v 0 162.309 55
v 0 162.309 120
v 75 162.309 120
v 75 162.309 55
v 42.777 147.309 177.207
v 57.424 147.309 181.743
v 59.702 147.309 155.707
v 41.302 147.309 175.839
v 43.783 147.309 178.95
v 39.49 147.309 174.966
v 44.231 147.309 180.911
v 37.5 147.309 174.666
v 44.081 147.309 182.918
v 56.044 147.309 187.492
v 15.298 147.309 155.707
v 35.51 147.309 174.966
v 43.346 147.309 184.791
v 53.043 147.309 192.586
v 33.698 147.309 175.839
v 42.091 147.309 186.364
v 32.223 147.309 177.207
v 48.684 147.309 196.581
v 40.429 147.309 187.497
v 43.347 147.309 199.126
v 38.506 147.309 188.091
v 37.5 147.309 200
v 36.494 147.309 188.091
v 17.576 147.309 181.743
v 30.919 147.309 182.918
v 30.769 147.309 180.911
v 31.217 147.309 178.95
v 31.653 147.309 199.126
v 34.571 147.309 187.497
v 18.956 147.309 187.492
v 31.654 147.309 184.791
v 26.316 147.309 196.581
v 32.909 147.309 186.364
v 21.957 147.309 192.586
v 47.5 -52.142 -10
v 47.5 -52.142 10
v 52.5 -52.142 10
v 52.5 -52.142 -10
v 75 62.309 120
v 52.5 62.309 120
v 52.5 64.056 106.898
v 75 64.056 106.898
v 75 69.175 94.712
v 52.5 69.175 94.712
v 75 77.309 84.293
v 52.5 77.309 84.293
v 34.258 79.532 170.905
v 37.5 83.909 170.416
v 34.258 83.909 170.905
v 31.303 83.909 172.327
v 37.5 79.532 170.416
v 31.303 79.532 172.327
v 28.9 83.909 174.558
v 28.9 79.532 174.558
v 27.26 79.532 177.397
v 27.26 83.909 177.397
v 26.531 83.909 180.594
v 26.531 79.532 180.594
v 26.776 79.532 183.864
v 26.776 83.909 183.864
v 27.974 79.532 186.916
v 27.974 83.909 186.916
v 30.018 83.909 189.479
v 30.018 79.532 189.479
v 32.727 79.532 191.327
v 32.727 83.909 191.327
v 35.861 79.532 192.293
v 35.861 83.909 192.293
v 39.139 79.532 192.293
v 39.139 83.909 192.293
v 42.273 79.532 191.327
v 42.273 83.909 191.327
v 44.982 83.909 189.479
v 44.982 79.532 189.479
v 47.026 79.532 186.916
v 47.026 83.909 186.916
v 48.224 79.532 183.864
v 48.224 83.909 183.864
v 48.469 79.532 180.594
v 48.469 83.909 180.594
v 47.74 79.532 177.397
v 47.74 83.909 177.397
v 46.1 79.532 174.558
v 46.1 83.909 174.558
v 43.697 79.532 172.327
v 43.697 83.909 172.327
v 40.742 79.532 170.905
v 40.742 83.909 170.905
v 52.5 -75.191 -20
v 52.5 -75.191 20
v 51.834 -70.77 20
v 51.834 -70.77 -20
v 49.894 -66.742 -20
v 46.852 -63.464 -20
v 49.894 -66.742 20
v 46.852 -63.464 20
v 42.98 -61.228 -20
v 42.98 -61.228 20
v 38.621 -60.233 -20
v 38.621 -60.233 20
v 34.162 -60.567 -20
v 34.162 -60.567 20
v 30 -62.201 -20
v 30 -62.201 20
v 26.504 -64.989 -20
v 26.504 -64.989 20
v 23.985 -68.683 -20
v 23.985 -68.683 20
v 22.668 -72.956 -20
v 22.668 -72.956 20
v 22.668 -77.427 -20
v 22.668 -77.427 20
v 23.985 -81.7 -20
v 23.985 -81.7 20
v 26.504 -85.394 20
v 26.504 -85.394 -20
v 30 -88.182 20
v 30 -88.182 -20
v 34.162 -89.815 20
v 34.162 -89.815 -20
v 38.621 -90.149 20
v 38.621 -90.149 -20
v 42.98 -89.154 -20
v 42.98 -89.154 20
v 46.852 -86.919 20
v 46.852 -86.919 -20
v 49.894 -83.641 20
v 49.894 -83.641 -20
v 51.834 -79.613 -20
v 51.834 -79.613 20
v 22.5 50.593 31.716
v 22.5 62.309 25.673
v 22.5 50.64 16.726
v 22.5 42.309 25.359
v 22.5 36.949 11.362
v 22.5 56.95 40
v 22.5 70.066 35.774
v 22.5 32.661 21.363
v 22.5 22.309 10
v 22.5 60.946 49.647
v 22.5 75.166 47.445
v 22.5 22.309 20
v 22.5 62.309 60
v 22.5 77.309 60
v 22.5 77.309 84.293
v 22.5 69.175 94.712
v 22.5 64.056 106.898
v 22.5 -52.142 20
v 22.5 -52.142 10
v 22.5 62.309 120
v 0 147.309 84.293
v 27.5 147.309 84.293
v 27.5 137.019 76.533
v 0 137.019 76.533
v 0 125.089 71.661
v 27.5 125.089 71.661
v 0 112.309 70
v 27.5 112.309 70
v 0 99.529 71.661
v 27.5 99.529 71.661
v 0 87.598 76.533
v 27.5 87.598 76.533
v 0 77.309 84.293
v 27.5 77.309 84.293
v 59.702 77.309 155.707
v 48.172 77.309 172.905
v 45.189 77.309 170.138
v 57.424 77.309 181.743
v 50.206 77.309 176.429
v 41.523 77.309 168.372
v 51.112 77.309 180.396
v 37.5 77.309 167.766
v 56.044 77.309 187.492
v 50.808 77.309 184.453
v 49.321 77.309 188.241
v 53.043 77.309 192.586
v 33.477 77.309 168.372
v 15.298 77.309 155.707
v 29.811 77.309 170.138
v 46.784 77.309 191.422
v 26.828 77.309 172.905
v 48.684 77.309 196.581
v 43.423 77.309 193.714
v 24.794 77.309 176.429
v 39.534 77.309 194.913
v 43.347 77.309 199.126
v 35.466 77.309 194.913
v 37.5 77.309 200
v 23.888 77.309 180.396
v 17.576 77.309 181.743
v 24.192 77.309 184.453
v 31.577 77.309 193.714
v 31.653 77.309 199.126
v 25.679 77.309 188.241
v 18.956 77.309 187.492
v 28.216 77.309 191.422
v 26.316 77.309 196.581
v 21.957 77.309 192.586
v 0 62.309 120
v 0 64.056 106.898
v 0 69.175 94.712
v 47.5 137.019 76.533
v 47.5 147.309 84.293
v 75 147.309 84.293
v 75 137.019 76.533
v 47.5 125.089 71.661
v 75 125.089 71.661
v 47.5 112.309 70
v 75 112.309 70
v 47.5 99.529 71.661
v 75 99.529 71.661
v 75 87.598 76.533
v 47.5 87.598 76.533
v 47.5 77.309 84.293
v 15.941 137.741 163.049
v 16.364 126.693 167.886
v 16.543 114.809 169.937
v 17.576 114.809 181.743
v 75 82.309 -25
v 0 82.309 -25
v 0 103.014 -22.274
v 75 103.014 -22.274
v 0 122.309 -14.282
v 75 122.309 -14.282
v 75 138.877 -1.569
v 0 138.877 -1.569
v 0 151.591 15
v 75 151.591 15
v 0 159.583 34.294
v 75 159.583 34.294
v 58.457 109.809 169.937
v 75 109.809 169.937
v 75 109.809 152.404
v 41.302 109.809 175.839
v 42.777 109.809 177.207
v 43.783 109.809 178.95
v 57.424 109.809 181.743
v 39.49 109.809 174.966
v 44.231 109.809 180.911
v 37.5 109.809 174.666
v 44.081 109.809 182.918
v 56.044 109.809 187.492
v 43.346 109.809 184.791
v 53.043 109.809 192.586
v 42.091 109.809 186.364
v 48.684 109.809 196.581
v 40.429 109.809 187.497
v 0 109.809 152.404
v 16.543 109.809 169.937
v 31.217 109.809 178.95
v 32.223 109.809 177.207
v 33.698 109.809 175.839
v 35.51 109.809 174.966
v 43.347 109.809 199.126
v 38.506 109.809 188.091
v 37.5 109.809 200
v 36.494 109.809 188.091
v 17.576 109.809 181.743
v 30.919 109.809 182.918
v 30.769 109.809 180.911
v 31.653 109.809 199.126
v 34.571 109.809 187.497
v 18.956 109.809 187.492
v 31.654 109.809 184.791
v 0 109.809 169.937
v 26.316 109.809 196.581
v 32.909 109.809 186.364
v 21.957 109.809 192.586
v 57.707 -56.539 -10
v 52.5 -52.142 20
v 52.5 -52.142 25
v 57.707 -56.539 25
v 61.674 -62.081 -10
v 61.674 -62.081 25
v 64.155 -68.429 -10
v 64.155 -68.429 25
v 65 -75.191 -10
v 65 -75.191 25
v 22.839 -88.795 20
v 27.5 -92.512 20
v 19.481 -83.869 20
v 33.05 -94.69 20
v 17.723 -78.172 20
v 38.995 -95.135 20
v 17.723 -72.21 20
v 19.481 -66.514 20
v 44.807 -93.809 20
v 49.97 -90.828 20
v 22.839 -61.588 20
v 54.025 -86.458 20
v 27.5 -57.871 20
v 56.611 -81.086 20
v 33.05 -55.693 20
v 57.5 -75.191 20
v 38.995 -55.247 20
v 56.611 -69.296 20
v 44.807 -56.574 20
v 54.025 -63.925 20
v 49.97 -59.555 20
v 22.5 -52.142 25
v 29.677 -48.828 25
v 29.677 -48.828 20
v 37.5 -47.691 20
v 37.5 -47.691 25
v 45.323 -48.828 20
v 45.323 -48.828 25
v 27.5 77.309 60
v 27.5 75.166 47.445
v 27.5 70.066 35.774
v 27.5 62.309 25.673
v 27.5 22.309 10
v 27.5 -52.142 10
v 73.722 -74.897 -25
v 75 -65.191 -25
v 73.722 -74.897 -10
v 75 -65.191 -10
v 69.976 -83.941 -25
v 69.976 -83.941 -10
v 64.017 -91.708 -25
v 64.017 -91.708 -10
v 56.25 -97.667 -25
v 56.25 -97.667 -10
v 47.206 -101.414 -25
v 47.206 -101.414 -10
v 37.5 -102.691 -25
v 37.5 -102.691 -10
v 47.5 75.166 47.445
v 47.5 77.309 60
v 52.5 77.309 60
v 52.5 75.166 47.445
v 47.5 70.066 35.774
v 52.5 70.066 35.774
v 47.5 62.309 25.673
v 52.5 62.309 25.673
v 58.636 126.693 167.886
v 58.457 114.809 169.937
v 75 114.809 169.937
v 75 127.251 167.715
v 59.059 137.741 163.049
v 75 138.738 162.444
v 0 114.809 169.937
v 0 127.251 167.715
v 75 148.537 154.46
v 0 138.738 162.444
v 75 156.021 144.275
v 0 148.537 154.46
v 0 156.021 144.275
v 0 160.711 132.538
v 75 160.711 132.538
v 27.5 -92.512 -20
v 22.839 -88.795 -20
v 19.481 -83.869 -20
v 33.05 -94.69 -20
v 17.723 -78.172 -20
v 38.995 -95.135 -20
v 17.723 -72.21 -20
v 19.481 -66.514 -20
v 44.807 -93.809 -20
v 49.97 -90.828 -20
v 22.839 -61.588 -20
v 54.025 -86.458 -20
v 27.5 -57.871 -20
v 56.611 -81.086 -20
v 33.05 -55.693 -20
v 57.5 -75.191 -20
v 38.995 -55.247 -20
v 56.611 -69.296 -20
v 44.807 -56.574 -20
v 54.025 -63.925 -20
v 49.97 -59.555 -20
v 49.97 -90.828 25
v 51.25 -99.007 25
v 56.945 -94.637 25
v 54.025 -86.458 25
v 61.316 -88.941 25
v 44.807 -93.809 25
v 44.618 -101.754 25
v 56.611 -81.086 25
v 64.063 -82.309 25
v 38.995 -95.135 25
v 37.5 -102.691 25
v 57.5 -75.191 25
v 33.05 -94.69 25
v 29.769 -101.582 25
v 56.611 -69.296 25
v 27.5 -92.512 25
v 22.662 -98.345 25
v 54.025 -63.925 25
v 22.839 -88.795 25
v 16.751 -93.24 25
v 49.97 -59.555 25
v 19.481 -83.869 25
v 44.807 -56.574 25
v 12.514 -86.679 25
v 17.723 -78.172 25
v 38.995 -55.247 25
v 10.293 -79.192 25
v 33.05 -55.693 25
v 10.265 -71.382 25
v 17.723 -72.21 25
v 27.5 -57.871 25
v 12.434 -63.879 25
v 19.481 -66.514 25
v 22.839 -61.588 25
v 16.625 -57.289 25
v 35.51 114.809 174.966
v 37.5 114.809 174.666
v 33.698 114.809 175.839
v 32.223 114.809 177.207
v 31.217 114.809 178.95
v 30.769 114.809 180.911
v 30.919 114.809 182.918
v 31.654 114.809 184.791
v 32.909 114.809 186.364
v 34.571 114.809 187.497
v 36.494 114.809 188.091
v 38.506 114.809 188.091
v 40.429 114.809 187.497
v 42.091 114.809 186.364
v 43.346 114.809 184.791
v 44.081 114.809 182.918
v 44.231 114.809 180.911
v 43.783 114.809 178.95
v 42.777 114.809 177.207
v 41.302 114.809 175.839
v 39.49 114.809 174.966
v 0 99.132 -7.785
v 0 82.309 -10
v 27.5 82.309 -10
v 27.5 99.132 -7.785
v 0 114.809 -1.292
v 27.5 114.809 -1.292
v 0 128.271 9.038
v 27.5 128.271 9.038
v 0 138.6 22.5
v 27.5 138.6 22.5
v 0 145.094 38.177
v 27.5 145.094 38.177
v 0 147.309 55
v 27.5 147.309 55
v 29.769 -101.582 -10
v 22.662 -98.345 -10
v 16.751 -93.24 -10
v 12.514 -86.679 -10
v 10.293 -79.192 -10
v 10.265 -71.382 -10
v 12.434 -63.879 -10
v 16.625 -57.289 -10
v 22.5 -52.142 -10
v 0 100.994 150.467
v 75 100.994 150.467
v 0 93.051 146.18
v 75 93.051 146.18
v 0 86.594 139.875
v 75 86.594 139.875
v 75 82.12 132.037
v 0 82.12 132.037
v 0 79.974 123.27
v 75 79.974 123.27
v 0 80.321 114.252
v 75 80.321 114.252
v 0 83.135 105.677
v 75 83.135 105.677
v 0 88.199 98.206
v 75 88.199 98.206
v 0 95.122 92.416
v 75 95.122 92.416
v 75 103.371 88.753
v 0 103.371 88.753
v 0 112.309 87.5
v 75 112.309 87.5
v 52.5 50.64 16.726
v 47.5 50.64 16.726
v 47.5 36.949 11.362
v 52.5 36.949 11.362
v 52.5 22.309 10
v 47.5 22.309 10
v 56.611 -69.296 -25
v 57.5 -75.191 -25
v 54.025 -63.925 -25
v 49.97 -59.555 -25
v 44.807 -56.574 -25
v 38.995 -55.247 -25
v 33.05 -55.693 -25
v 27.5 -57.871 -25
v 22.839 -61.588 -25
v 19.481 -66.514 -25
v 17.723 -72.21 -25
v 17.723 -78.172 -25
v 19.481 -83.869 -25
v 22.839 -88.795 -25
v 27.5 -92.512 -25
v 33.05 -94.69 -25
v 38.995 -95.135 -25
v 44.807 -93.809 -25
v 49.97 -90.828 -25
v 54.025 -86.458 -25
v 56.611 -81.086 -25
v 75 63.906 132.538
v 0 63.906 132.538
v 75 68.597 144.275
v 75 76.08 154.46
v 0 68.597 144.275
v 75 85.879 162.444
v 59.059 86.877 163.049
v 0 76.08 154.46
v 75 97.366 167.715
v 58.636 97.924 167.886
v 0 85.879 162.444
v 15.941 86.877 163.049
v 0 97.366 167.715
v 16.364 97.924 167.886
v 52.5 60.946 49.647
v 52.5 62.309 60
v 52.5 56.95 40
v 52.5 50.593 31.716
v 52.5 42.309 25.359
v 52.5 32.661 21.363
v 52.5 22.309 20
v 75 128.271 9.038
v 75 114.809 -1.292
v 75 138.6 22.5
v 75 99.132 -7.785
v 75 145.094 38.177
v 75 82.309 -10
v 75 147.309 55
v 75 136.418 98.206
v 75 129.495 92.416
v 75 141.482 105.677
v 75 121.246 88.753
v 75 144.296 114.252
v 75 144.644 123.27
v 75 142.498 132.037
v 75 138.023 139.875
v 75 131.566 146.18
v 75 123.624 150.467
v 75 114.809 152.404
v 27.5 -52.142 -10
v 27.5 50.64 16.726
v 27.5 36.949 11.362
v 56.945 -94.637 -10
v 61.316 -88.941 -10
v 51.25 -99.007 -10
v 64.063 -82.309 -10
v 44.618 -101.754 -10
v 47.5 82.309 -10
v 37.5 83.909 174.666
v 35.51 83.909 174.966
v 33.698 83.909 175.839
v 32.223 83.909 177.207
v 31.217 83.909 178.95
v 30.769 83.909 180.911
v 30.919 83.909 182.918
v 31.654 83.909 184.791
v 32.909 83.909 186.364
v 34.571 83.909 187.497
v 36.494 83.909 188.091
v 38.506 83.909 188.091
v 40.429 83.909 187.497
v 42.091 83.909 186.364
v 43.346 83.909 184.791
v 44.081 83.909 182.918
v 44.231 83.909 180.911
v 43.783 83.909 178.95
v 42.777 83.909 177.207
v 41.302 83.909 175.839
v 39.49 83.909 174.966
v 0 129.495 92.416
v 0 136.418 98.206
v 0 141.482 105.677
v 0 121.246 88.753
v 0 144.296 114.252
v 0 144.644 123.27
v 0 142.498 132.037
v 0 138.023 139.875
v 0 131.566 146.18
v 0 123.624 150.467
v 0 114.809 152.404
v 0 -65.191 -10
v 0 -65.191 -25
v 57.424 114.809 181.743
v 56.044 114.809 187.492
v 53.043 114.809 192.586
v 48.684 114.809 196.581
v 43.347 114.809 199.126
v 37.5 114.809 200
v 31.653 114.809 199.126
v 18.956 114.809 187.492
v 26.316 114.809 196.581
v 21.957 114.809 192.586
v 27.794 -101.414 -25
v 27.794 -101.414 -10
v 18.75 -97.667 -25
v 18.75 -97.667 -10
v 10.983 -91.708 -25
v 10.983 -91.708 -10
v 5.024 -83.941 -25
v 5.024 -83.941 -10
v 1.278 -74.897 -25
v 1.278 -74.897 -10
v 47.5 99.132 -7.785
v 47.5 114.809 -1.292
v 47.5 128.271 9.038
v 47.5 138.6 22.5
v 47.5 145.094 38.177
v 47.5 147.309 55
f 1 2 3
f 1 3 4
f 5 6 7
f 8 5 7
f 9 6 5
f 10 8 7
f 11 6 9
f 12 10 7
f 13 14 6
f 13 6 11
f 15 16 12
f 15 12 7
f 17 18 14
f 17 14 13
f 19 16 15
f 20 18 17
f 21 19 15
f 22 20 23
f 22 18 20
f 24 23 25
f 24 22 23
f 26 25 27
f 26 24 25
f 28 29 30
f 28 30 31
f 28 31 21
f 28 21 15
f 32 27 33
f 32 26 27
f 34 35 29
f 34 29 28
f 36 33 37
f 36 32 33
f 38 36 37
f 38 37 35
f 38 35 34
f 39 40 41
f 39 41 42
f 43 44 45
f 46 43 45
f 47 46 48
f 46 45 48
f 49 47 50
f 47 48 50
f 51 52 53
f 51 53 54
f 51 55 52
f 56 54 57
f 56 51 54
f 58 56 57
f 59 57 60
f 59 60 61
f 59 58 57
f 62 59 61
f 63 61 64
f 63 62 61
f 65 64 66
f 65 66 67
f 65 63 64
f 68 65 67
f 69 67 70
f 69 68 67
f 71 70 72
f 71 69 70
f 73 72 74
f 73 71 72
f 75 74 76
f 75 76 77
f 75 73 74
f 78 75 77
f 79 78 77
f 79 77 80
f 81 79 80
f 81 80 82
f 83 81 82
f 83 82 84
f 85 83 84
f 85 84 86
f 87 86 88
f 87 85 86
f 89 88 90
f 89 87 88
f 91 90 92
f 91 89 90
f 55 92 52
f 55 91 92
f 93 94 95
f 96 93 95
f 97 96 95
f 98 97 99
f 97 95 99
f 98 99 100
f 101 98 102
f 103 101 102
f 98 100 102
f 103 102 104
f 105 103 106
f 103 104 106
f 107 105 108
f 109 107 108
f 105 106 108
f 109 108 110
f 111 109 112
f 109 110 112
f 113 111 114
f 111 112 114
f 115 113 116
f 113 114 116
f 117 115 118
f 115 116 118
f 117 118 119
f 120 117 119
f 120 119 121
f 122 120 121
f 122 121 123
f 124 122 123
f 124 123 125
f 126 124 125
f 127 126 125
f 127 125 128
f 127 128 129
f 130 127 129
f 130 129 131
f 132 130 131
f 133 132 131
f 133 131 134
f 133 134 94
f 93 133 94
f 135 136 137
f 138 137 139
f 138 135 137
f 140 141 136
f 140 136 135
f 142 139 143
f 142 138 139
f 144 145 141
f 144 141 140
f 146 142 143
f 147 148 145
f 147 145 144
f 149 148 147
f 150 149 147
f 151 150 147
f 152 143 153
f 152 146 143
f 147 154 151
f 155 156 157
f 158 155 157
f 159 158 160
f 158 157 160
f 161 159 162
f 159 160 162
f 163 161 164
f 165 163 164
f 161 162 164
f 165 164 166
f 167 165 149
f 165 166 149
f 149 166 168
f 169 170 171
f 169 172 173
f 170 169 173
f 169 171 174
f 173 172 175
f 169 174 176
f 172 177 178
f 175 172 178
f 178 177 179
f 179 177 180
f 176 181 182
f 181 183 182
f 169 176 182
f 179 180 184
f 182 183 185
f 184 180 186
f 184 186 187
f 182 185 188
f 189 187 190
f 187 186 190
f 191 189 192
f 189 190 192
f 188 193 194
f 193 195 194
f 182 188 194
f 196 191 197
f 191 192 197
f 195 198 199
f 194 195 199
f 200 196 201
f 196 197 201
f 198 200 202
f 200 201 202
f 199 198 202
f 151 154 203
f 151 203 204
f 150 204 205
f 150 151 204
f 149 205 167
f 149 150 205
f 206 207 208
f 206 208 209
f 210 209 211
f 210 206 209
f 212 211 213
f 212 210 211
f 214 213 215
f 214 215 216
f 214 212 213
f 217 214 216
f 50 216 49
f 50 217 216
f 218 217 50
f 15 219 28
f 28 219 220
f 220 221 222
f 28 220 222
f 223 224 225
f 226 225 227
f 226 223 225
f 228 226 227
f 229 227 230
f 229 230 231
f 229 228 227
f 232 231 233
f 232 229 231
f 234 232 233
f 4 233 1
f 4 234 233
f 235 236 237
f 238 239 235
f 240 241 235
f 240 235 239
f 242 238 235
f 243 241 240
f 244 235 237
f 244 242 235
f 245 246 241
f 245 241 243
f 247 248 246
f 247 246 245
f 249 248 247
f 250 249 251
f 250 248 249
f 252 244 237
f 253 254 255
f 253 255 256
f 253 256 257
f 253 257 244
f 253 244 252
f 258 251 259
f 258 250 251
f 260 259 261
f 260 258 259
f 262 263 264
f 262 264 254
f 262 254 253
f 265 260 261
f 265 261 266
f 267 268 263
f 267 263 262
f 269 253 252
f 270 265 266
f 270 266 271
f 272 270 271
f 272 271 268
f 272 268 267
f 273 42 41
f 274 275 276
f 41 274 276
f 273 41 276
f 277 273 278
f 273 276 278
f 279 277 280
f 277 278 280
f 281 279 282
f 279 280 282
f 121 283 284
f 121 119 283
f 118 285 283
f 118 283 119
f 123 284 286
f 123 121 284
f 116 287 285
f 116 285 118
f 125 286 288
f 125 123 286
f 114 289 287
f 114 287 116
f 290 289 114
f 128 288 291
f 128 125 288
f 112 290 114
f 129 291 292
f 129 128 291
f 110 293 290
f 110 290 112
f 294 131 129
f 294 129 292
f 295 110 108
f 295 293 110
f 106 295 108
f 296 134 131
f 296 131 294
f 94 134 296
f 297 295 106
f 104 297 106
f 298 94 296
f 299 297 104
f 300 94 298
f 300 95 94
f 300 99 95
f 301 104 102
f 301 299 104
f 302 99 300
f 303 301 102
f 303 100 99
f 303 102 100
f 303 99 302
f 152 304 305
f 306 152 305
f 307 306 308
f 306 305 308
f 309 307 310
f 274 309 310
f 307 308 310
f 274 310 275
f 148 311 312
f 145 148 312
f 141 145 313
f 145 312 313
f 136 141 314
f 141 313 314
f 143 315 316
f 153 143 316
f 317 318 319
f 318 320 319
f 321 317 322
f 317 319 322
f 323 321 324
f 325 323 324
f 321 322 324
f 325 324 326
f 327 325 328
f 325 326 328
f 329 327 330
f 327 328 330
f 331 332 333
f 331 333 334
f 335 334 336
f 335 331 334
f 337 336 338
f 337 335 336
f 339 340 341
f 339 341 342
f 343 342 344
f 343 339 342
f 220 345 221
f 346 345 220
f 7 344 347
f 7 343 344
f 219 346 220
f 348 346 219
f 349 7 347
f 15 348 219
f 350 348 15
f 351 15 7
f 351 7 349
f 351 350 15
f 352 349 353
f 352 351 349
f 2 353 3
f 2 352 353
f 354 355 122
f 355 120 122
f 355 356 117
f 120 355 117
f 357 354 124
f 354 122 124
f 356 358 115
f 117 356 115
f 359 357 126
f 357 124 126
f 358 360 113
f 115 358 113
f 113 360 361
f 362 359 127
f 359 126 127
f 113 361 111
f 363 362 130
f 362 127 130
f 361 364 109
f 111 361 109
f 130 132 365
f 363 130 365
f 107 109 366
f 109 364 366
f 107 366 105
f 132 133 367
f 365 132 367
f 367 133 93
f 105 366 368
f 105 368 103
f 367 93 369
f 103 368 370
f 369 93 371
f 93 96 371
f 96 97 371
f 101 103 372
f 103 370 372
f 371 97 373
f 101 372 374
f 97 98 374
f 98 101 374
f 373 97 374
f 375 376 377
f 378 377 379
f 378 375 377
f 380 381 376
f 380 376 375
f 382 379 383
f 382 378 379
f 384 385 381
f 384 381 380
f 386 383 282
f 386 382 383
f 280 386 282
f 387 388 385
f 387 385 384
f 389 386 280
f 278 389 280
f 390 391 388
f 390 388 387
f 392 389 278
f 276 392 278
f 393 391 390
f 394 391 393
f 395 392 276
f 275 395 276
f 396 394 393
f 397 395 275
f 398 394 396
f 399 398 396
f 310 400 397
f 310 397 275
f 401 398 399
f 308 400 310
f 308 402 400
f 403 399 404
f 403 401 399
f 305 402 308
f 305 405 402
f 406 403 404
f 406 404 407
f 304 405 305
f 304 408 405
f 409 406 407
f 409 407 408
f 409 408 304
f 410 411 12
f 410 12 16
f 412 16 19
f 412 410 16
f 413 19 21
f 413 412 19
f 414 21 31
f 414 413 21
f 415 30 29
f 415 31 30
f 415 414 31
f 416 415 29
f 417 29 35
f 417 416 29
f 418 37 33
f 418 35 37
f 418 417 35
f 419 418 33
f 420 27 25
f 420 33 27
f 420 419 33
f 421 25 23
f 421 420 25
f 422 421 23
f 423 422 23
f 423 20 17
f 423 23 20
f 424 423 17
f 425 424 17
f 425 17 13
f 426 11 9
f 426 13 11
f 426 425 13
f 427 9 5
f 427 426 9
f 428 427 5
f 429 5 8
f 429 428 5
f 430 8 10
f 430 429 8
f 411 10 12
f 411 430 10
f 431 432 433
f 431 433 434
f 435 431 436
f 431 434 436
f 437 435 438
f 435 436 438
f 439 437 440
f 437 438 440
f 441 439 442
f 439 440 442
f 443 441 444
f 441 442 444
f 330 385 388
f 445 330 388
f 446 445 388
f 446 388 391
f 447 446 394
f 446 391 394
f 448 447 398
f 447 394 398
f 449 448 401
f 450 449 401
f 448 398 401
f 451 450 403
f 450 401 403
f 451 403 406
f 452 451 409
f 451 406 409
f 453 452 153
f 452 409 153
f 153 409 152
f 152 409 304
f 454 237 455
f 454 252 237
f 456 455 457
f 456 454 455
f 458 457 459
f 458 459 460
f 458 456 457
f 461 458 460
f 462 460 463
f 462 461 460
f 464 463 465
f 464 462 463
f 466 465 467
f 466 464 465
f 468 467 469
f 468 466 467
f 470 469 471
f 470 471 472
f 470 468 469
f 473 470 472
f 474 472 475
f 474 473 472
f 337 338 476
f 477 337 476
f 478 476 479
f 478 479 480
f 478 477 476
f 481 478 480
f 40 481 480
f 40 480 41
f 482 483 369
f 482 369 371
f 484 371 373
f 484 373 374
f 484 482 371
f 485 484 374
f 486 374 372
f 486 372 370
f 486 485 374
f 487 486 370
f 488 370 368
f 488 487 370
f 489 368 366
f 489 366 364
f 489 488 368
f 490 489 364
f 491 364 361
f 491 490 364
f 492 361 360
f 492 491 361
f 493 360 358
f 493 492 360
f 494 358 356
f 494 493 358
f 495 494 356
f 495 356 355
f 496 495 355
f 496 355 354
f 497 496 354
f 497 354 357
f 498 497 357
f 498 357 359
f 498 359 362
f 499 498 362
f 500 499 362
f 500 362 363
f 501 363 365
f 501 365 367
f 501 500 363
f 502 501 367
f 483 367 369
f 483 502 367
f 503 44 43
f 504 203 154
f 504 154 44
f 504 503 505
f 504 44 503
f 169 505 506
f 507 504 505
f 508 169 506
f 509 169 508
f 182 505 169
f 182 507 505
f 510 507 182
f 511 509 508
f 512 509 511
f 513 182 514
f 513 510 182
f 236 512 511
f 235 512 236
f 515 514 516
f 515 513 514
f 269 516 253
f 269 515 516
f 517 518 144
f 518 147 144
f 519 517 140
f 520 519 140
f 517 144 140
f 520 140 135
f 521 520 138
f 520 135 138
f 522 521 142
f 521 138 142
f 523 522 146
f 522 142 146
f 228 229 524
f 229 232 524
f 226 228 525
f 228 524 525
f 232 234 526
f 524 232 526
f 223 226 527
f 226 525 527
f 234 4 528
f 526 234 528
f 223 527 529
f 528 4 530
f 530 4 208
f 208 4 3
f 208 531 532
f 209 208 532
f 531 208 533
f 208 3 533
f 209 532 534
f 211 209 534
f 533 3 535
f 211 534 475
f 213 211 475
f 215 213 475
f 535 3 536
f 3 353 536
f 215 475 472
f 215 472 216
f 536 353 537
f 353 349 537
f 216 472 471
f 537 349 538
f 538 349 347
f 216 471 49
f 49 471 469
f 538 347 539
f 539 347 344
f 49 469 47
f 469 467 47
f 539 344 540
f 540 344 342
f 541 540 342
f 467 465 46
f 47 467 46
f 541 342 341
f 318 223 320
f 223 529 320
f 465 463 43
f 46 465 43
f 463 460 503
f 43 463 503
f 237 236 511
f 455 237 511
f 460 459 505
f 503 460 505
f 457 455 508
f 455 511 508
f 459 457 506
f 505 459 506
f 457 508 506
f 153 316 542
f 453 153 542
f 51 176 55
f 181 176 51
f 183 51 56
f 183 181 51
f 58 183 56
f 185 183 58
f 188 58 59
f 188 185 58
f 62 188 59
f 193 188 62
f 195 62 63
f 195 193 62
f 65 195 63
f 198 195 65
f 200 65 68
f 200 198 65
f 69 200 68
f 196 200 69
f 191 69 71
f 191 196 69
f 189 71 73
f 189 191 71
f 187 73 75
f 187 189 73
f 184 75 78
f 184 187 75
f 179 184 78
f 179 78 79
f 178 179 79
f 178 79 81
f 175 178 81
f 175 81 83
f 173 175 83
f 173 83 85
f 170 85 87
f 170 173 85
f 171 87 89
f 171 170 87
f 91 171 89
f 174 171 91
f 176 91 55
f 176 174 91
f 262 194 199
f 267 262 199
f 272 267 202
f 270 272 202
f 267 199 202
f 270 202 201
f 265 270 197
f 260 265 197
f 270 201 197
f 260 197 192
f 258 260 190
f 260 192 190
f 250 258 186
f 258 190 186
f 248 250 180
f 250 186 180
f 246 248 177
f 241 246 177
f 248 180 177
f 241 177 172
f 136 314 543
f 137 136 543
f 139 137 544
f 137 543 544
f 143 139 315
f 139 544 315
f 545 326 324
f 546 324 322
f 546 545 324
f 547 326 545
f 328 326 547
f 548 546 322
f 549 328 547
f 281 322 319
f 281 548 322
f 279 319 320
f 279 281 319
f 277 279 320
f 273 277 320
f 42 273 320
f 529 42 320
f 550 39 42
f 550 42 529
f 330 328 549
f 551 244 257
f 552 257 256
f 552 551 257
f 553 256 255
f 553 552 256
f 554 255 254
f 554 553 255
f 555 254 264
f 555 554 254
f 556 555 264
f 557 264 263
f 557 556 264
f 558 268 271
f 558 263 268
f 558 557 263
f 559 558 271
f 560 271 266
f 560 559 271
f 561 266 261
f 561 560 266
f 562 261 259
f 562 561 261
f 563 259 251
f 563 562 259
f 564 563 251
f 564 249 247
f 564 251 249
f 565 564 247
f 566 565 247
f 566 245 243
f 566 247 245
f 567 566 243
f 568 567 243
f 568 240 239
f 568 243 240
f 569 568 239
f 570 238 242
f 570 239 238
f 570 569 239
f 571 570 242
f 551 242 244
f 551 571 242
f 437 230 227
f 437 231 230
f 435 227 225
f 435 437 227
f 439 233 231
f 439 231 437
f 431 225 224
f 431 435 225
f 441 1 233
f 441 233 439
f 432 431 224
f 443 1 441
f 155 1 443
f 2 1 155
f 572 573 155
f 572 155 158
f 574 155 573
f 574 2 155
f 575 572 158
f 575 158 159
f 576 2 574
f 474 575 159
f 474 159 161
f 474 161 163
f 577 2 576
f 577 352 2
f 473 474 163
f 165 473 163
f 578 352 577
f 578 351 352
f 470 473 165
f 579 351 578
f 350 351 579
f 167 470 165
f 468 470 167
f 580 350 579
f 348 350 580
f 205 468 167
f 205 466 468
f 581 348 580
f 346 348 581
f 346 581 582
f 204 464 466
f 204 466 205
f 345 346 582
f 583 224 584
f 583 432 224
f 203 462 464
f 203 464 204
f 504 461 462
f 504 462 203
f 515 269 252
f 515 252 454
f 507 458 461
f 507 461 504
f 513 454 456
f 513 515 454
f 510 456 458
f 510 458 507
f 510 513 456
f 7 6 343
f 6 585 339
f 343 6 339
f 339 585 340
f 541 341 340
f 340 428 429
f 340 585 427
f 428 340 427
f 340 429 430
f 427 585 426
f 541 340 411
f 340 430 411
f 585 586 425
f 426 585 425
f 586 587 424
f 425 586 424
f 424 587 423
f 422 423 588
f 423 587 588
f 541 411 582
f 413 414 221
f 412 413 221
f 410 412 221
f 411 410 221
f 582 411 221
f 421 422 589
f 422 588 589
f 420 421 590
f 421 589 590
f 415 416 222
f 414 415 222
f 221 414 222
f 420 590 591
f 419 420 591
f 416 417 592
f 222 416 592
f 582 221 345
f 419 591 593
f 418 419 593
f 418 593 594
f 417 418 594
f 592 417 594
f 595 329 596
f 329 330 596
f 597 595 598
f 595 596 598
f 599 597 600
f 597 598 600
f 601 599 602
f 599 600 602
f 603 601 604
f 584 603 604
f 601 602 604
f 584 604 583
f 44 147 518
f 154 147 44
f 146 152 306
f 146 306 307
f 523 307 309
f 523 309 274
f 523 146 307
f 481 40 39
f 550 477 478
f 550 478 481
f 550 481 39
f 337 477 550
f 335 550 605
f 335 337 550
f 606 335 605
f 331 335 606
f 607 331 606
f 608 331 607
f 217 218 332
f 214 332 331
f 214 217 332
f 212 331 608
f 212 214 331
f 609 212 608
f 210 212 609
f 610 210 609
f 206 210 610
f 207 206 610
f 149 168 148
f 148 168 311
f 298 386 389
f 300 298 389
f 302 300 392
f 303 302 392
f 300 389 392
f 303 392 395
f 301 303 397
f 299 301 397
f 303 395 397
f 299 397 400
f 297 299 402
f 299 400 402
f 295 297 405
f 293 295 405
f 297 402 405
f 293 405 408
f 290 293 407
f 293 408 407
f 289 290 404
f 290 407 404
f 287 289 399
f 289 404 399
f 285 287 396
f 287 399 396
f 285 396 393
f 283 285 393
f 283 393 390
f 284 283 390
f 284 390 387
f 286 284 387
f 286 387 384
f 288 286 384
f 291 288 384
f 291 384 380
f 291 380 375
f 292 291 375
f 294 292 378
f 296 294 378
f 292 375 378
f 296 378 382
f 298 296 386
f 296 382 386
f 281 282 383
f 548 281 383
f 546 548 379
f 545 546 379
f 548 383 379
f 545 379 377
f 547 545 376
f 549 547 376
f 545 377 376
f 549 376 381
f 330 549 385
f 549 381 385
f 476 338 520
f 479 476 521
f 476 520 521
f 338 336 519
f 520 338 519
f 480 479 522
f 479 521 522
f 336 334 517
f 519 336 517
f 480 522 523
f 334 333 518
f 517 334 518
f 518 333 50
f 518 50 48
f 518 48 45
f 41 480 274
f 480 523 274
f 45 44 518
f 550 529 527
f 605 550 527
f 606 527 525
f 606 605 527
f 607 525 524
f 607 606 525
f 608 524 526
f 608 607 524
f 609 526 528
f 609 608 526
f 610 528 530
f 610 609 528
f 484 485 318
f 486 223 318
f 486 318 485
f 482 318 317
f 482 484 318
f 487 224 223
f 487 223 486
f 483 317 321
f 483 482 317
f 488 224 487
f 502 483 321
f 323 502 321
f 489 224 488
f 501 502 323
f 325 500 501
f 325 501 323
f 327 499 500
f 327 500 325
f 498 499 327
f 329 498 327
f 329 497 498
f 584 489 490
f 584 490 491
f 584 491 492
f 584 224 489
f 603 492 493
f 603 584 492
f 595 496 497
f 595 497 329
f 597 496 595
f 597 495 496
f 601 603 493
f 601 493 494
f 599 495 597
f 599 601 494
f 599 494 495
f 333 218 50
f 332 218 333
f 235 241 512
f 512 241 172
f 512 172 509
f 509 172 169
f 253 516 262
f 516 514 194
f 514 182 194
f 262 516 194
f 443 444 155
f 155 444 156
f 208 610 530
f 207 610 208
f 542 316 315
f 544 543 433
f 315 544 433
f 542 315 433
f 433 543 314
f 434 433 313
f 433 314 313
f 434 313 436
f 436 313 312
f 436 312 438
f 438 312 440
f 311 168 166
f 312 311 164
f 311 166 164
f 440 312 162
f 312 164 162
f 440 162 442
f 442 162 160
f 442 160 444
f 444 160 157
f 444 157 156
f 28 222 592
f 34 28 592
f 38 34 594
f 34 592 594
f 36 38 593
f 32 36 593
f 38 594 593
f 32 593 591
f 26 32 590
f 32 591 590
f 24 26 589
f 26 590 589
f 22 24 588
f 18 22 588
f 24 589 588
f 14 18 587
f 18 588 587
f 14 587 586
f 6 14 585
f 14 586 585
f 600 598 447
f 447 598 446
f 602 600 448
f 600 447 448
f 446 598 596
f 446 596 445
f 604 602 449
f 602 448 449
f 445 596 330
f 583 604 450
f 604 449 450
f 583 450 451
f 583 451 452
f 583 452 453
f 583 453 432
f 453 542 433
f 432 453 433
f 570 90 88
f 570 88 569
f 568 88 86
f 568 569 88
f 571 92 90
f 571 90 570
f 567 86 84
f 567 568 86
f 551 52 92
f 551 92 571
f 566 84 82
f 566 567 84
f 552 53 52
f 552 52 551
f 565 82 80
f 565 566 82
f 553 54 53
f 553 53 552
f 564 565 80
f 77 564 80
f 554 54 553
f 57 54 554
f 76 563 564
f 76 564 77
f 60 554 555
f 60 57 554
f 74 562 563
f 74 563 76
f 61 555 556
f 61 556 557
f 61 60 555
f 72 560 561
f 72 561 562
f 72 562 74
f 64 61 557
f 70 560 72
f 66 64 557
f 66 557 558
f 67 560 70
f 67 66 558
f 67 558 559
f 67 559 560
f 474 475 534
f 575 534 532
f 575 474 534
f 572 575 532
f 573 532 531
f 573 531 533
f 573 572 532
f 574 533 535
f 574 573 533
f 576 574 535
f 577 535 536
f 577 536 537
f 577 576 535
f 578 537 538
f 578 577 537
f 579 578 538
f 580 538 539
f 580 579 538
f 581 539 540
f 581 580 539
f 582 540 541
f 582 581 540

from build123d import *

# Parameters (mm, degrees)
SKETCH1_R                = 32.5
BOSS_EXTRUDE1_DEPTH      = 75
FILLET1_R                = 80
CUT_EXTRUDE3_DEPTH       = 35
FILLET2_R                = 37.5
CUT_EXTRUDE13_DEPTH      = 5
FILLET6_R                = 40
CUT_EXTRUDE14_START      = -27.5
CUT_EXTRUDE14_DEPTH      = 27.5
CUT_EXTRUDE15_START      = -22.5
CUT_EXTRUDE15_DEPTH      = 22.5
SKETCH9_R                = 15
CUT_EXTRUDE16_DEPTH      = 231.204488166
SKETCH10_R               = 20
CUT_EXTRUDE17_DEPTH      = 5
BOSS_EXTRUDE2_DEPTH      = 70
CUT_EXTRUDE20_REACH      = 289.392
CUT_EXTRUDE20_END_RADIUS = 32.5
SKETCH18_W               = 75
SKETCH18_H               = 5


with BuildPart() as part:
    # Sketch1 → Boss-Extrude1 (new body)
    with BuildSketch(Plane.YZ):
        with BuildLine():
            Line((162.308676206, -25), (-102.691323794, -25))
            Line((-102.691323794, -25), (-102.691323794, 25))
            Line((-102.691323794, 25), (62.308676206, 25))
            Line((62.308676206, 25), (62.308676206, 120))
            ThreePointArc((62.308676206, 120), (112.308676206, 170), (162.308676206, 120))
            Line((162.308676206, 120), (162.308676206, -25))
        make_face()
        with Locations(Location((112.308676206, 120, 0), (0, 0, 270))):
            Circle(SKETCH1_R, mode=Mode.SUBTRACT)
    extrude(amount=BOSS_EXTRUDE1_DEPTH)

    # Fillet1
    fillet1_edges = [part.edges().sort_by_distance(p)[0] for p in [
        (37.5, 162.308676206, -25),
    ]]
    fillet(fillet1_edges, radius=FILLET1_R)

    # Sketch3 → Cut-Extrude3 (cut)
    with BuildSketch(Plane.XY.offset(25)):
        with BuildLine():
            Line((75, 62.308676206), (52.5, 62.308676206))
            Line((52.5, 62.308676206), (52.5, -52.14246265))
            ThreePointArc((52.5, -52.14246265), (61.673849507, -62.081213191), (65, -75.191323794))
            ThreePointArc((65, -75.191323794), (56.945436483, -94.636760276), (37.5, -102.691323794))
            Line((37.5, -102.691323794), (75, -102.691323794))
            Line((75, -102.691323794), (75, 62.308676206))
        make_face()
        with BuildLine():
            Line((22.5, -52.14246265), (22.5, 62.308676206))
            Line((22.5, 62.308676206), (0, 62.308676206))
            Line((0, 62.308676206), (0, -102.691323794))
            Line((0, -102.691323794), (37.5, -102.691323794))
            ThreePointArc((37.5, -102.691323794), (11.136258977, -83.014568599), (22.5, -52.14246265))
        make_face()
    extrude(amount=-CUT_EXTRUDE3_DEPTH, mode=Mode.SUBTRACT)

    # Fillet2
    fillet2_edges = [part.edges().sort_by_distance(p)[0] for p in [
        (0, -102.691323794, -17.5),
        (75, -102.691323794, -17.5),
    ]]
    fillet(fillet2_edges, radius=FILLET2_R - 0.0001)  # a hair under: the kernel refuses the full size

    # Sketch7 → Cut-Extrude13 (cut)
    with BuildSketch(Plane.XY.offset(25)):
        with BuildLine():
            Line((52.5, 62.308676206), (22.5, 62.308676206))
            Line((22.5, 62.308676206), (22.5, -52.14246265))
            ThreePointArc((22.5, -52.14246265), (37.5, -47.691323794), (52.5, -52.14246265))
            Line((52.5, -52.14246265), (52.5, 62.308676206))
        make_face()
    extrude(amount=-CUT_EXTRUDE13_DEPTH, mode=Mode.SUBTRACT)

    # Fillet6
    fillet6_edges = [part.edges().sort_by_distance(p)[0] for p in [
        (37.5, 62.308676206, 20),
    ]]
    fillet(fillet6_edges, radius=FILLET6_R)

    # Sketch5 → Cut-Extrude14 (cut)
    with BuildSketch(Plane.YZ.offset(75).offset(CUT_EXTRUDE14_START)):
        with BuildLine():
            ThreePointArc((77.308676206, 60), (72.970807341, 41.454593742), (62.308676206, 25.672700343))
            Line((62.308676206, 25.672700343), (62.308676206, 25))
            Line((62.308676206, 25), (62.308676206, -10))
            Line((62.308676206, -10), (82.308676206, -10))
            ThreePointArc((82.308676206, -10), (128.270616984, 9.038059223), (147.308676206, 55))
            Line((147.308676206, 55), (147.308676206, 84.292857857))
            ThreePointArc((147.308676206, 84.292857857), (112.308676206, 70), (77.308676206, 84.292857857))
            Line((77.308676206, 84.292857857), (77.308676206, 60))
        make_face()
        with BuildLine():
            Line((22.308676206, 10), (-52.14246265, 10))
            Line((-52.14246265, 10), (-52.14246265, -10))
            Line((-52.14246265, -10), (62.308676206, -10))
            Line((62.308676206, -10), (62.308676206, 25))
            Line((62.308676206, 25), (62.308676206, 25.672700343))
            ThreePointArc((62.308676206, 25.672700343), (43.98309625, 13.562881), (22.308676206, 10))
        make_face()
    cut_extrude14 = extrude(amount=CUT_EXTRUDE14_DEPTH, mode=Mode.SUBTRACT)

    # Sketch8 → Cut-Extrude15 (cut)
    with BuildSketch(Plane.YZ.offset(75).offset(CUT_EXTRUDE15_START)):
        with BuildLine():
            ThreePointArc((62.308676206, 120), (66.21095392, 100.635083269), (77.308676206, 84.292857857))
            Line((77.308676206, 84.292857857), (77.308676206, 60))
            ThreePointArc((77.308676206, 60), (72.970807341, 41.454593742), (62.308676206, 25.672700343))
            Line((62.308676206, 25.672700343), (62.308676206, 120))
        make_face()
    cut_extrude15 = extrude(amount=CUT_EXTRUDE15_DEPTH, mode=Mode.SUBTRACT)

    # Mirror2: Cut-Extrude14, Cut-Extrude15 across plane
    add(cut_extrude14.mirror(Plane(origin=(37.5, 0, 0), x_dir=(0, 0, 1), z_dir=(1, 0, 0))), mode=Mode.SUBTRACT)
    add(cut_extrude15.mirror(Plane(origin=(37.5, 0, 0), x_dir=(0, 0, 1), z_dir=(1, 0, 0))), mode=Mode.SUBTRACT)

    # Sketch9 → Cut-Extrude16 (cut, through all)
    with BuildSketch(Plane.XY.offset(25)):
        with Locations((37.5, -75.191323794)):
            Circle(SKETCH9_R)
    cut_extrude16 = extrude(amount=-CUT_EXTRUDE16_DEPTH, mode=Mode.SUBTRACT)

    # Sketch10 → Cut-Extrude17 (cut)
    with BuildSketch(Plane.XY.offset(25)):
        with Locations((37.5, -75.191323794)):
            Circle(SKETCH10_R)
    cut_extrude17 = extrude(amount=-CUT_EXTRUDE17_DEPTH, mode=Mode.SUBTRACT)

    # Mirror3: Cut-Extrude16, Cut-Extrude17 across plane
    add(cut_extrude16.mirror(Plane.XY), mode=Mode.SUBTRACT)
    add(cut_extrude17.mirror(Plane.XY), mode=Mode.SUBTRACT)

    # Sketch13 → Boss-Extrude2 (add)
    with BuildSketch(Plane(origin=(0, 77.30867621, 0), x_dir=(-1, 0, 0), z_dir=(0, 1, 0))):
        with BuildLine():
            Line((-57.423893962, 181.743114855), (-59.932978613, 153.06414606))
            Line((-59.932978613, 153.06414606), (-15.067021387, 153.06414606))
            Line((-15.067021387, 153.06414606), (-17.576106038, 181.743114855))
            ThreePointArc((-17.576106038, 181.743114855), (-37.5, 200), (-57.423893962, 181.743114855))
        make_face()
    extrude(amount=BOSS_EXTRUDE2_DEPTH)

    # Sketch20 → CBORE for M14 Hex Head Cap Screw1 (revolve, cut)
    with BuildSketch(Plane(origin=(37.5, 77.30867621, 181.415910965), x_dir=(0, 0, -1), z_dir=(1, 0, 0))):
        Polygon((0, 0), (0, 84.999999996), (6.75, 84.999999996), (6.75, 6.6), (11, 6.6), (11, 2.223614023), (13.65, 0), align=None)
    revolve(axis=Axis((37.5, 70.95867621, 181.415910965), (0, 1, 0)), mode=Mode.SUBTRACT)

    # Cut-Extrude20: up to this cylinder (the profile starts outside it)
    cut_extrude20_end = Plane(origin=(37.5, 112.308676206, 120), z_dir=(-1, 0, 0)) * Cylinder(CUT_EXTRUDE20_END_RADIUS, 644.784, mode=Mode.PRIVATE)
    # Sketch18 → Cut-Extrude20 (cut, up to the surface)
    with BuildSketch(Plane(origin=(0, 0, 200), x_dir=(-1, 0, 0), z_dir=(0, 0, -1)), mode=Mode.PRIVATE) as cut_extrude20_sk1:
        with Locations((-37.5, 112.308676206)):
            Rectangle(SKETCH18_W, SKETCH18_H)
    cut_extrude20_tool1 = extrude(cut_extrude20_sk1.sketch, amount=CUT_EXTRUDE20_REACH, mode=Mode.PRIVATE) - cut_extrude20_end
    add(cut_extrude20_tool1.solids().sort_by_distance((37.5, 112.308676, 200))[0], mode=Mode.SUBTRACT)


solid = part.part
